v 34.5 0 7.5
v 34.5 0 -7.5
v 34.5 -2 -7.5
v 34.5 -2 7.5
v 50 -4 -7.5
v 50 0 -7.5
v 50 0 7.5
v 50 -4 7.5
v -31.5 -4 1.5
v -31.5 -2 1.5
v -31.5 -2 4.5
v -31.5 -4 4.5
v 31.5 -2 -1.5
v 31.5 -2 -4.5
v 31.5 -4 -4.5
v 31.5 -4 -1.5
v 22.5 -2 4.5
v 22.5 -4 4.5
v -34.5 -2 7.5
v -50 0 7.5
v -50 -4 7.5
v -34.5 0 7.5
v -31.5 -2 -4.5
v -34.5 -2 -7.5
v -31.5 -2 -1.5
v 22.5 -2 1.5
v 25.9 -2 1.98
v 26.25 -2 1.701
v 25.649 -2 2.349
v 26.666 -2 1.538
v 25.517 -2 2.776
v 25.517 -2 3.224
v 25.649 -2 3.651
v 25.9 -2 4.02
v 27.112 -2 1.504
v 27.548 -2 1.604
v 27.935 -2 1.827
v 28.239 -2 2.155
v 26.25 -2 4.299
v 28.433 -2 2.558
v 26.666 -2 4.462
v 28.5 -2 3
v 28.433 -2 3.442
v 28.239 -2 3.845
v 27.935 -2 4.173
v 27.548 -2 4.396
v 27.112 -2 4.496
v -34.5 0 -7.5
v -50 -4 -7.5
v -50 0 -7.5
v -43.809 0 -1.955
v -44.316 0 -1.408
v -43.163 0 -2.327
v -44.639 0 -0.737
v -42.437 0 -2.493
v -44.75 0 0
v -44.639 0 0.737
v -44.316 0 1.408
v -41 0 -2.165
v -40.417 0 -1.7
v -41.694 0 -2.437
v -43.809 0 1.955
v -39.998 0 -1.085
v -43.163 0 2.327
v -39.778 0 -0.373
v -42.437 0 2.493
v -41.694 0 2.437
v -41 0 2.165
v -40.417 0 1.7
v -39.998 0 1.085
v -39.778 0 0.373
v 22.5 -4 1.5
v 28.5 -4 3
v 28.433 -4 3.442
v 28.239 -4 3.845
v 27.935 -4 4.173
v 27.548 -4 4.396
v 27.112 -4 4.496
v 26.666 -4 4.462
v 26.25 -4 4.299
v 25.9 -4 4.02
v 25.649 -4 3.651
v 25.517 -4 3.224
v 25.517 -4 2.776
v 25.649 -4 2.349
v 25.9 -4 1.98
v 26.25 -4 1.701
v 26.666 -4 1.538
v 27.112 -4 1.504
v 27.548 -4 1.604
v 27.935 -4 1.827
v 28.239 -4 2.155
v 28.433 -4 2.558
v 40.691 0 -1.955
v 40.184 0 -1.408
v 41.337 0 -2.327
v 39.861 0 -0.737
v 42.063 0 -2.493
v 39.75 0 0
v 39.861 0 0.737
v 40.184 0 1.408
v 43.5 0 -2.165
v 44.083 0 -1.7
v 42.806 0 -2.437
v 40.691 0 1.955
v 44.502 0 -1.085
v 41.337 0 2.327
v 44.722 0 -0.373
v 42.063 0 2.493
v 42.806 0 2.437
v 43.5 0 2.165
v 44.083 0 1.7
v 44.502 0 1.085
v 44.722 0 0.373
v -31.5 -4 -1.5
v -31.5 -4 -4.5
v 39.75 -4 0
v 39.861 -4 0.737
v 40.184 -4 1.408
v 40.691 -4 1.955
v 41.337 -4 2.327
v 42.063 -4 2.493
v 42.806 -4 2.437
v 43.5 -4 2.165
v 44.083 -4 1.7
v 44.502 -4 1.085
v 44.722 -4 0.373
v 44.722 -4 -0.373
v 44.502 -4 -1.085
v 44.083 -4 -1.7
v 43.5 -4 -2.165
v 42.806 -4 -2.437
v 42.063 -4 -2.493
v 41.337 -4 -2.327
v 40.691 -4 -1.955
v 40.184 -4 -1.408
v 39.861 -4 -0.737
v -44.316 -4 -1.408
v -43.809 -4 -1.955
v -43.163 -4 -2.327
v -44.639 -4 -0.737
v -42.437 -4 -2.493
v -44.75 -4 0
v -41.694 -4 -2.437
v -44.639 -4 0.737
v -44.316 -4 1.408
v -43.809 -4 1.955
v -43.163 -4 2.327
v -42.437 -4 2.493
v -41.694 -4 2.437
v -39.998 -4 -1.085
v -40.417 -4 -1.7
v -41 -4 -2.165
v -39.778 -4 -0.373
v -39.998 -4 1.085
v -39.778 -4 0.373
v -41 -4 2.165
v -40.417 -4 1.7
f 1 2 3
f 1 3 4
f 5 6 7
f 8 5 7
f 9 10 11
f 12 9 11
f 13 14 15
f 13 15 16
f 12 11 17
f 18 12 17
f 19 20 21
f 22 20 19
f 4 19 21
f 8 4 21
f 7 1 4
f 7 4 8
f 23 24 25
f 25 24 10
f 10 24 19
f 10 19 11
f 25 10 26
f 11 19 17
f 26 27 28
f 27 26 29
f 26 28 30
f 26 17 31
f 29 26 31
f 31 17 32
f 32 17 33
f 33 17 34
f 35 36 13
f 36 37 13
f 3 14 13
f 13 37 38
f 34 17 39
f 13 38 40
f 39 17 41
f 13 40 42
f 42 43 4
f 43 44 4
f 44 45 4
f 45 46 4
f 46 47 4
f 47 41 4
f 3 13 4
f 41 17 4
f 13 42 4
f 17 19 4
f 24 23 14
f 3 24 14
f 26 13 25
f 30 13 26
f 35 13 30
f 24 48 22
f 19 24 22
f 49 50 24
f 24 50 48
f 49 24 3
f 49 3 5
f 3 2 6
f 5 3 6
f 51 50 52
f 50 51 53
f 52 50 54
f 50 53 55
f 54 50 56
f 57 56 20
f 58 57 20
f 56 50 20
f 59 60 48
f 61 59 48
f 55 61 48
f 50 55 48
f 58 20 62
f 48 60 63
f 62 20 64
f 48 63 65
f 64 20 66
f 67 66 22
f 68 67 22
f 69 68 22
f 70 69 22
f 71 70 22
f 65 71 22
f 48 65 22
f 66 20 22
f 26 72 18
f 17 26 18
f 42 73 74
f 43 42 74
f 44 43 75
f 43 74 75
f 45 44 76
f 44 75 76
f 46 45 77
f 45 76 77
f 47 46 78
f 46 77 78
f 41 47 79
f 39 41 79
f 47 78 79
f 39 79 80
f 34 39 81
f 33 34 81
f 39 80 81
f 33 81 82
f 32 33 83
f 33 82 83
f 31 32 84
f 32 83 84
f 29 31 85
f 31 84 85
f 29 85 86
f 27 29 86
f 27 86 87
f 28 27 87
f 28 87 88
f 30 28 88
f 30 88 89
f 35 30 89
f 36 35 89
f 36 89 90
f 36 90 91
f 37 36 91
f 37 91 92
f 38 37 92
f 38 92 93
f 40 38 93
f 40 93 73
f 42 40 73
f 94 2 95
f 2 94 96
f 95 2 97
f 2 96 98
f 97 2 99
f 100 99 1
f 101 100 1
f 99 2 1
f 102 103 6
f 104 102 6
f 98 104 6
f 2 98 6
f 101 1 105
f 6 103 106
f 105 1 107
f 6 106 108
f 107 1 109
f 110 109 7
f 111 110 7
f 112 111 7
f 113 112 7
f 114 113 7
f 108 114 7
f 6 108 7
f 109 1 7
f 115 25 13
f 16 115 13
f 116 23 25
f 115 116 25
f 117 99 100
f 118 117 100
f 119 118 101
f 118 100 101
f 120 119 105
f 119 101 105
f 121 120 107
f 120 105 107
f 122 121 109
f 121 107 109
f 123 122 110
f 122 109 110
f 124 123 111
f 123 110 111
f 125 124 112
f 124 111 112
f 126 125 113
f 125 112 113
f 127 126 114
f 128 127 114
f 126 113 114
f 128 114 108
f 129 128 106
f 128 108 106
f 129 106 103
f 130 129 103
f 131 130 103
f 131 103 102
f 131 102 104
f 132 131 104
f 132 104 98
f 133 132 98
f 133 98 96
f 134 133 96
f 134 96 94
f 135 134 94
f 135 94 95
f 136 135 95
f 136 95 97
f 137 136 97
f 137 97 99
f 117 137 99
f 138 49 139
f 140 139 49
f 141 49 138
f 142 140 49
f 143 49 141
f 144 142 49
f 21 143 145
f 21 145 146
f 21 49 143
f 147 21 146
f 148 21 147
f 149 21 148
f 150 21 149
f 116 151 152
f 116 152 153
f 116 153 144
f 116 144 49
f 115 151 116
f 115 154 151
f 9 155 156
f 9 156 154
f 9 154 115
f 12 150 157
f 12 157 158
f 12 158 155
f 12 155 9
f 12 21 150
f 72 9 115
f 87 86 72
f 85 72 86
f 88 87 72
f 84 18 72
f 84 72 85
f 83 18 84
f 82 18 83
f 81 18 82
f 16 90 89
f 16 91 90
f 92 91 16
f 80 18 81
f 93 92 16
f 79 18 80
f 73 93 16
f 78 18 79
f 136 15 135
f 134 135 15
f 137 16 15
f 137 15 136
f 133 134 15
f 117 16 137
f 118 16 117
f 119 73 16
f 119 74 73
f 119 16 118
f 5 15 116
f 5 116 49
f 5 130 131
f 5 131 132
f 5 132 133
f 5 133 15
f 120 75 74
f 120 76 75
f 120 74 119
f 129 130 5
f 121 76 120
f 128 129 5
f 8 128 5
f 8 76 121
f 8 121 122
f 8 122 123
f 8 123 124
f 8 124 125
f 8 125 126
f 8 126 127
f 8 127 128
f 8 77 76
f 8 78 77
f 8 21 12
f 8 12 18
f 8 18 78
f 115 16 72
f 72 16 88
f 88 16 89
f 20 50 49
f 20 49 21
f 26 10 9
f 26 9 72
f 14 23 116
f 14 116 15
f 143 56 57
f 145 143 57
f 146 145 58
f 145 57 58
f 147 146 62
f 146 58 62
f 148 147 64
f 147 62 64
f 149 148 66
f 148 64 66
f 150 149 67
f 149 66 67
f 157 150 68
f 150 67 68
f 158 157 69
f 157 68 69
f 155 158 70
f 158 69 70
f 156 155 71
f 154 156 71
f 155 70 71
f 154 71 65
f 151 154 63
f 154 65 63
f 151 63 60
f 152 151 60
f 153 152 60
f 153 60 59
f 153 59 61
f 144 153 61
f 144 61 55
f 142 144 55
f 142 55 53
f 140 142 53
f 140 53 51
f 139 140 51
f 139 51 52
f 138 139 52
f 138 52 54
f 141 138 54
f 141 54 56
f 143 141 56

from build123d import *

# Parameters (mm, degrees)
F0_W      = 100
F0_H      = 15
F0_W_2    = 63
F0_H_2    = 3
F1_DEPTH  = 4
F2_W      = 69
F2_H      = 15
F3_DEPTH  = 2
F4_R      = 2.5
F5_DEPTH  = 25
F6_R      = 2.5
F7_DEPTH  = 25
F8_W      = 9
F8_H      = 3
F9_DEPTH  = 2
F10_R     = 1.5
F11_DEPTH = 25


with BuildPart() as f1:
    # F0 (on Front) → F1 (new body)
    with BuildSketch(Plane.XZ):
        Rectangle(F0_W, F0_H)
        with Locations((0, -3)):
            Rectangle(F0_W_2, F0_H_2, mode=Mode.SUBTRACT)
        with Locations((0, 3)):
            Rectangle(F0_W_2, F0_H_2, mode=Mode.SUBTRACT)
    extrude(amount=F1_DEPTH)

    # F2 (on face) → F3 (cut)
    with BuildSketch(Plane(origin=(0, 0, 0), x_dir=(-1, 0, 0), z_dir=(0, 1, 0))):
        Rectangle(F2_W, F2_H)
    extrude(amount=-F3_DEPTH, mode=Mode.SUBTRACT)

    # F4 (on face) → F5 (cut)
    with BuildSketch(Plane(origin=(0, 0, 0), x_dir=(-1, 0, 0), z_dir=(0, 1, 0))):
        with Locations((-42.25, 0)):
            Circle(F4_R)
    extrude(amount=-F5_DEPTH, mode=Mode.SUBTRACT)

    # F6 (on face) → F7 (cut)
    with BuildSketch(Plane(origin=(0, 0, 0), x_dir=(-1, 0, 0), z_dir=(0, 1, 0))):
        with Locations((42.25, 0)):
            Circle(F6_R)
    extrude(amount=-F7_DEPTH, mode=Mode.SUBTRACT)

    # F8 (on face) → F9 (join)
    with BuildSketch(Plane.XZ.offset(4)):
        with Locations((27, 3)):
            Rectangle(F8_W, F8_H)
    extrude(amount=-F9_DEPTH)

    # F10 (on face) → F11 (cut)
    with BuildSketch(Plane.XZ.offset(4)):
        with Locations((27, 3)):
            Circle(F10_R)
    extrude(amount=-F11_DEPTH, mode=Mode.SUBTRACT)


solid = f1.part
